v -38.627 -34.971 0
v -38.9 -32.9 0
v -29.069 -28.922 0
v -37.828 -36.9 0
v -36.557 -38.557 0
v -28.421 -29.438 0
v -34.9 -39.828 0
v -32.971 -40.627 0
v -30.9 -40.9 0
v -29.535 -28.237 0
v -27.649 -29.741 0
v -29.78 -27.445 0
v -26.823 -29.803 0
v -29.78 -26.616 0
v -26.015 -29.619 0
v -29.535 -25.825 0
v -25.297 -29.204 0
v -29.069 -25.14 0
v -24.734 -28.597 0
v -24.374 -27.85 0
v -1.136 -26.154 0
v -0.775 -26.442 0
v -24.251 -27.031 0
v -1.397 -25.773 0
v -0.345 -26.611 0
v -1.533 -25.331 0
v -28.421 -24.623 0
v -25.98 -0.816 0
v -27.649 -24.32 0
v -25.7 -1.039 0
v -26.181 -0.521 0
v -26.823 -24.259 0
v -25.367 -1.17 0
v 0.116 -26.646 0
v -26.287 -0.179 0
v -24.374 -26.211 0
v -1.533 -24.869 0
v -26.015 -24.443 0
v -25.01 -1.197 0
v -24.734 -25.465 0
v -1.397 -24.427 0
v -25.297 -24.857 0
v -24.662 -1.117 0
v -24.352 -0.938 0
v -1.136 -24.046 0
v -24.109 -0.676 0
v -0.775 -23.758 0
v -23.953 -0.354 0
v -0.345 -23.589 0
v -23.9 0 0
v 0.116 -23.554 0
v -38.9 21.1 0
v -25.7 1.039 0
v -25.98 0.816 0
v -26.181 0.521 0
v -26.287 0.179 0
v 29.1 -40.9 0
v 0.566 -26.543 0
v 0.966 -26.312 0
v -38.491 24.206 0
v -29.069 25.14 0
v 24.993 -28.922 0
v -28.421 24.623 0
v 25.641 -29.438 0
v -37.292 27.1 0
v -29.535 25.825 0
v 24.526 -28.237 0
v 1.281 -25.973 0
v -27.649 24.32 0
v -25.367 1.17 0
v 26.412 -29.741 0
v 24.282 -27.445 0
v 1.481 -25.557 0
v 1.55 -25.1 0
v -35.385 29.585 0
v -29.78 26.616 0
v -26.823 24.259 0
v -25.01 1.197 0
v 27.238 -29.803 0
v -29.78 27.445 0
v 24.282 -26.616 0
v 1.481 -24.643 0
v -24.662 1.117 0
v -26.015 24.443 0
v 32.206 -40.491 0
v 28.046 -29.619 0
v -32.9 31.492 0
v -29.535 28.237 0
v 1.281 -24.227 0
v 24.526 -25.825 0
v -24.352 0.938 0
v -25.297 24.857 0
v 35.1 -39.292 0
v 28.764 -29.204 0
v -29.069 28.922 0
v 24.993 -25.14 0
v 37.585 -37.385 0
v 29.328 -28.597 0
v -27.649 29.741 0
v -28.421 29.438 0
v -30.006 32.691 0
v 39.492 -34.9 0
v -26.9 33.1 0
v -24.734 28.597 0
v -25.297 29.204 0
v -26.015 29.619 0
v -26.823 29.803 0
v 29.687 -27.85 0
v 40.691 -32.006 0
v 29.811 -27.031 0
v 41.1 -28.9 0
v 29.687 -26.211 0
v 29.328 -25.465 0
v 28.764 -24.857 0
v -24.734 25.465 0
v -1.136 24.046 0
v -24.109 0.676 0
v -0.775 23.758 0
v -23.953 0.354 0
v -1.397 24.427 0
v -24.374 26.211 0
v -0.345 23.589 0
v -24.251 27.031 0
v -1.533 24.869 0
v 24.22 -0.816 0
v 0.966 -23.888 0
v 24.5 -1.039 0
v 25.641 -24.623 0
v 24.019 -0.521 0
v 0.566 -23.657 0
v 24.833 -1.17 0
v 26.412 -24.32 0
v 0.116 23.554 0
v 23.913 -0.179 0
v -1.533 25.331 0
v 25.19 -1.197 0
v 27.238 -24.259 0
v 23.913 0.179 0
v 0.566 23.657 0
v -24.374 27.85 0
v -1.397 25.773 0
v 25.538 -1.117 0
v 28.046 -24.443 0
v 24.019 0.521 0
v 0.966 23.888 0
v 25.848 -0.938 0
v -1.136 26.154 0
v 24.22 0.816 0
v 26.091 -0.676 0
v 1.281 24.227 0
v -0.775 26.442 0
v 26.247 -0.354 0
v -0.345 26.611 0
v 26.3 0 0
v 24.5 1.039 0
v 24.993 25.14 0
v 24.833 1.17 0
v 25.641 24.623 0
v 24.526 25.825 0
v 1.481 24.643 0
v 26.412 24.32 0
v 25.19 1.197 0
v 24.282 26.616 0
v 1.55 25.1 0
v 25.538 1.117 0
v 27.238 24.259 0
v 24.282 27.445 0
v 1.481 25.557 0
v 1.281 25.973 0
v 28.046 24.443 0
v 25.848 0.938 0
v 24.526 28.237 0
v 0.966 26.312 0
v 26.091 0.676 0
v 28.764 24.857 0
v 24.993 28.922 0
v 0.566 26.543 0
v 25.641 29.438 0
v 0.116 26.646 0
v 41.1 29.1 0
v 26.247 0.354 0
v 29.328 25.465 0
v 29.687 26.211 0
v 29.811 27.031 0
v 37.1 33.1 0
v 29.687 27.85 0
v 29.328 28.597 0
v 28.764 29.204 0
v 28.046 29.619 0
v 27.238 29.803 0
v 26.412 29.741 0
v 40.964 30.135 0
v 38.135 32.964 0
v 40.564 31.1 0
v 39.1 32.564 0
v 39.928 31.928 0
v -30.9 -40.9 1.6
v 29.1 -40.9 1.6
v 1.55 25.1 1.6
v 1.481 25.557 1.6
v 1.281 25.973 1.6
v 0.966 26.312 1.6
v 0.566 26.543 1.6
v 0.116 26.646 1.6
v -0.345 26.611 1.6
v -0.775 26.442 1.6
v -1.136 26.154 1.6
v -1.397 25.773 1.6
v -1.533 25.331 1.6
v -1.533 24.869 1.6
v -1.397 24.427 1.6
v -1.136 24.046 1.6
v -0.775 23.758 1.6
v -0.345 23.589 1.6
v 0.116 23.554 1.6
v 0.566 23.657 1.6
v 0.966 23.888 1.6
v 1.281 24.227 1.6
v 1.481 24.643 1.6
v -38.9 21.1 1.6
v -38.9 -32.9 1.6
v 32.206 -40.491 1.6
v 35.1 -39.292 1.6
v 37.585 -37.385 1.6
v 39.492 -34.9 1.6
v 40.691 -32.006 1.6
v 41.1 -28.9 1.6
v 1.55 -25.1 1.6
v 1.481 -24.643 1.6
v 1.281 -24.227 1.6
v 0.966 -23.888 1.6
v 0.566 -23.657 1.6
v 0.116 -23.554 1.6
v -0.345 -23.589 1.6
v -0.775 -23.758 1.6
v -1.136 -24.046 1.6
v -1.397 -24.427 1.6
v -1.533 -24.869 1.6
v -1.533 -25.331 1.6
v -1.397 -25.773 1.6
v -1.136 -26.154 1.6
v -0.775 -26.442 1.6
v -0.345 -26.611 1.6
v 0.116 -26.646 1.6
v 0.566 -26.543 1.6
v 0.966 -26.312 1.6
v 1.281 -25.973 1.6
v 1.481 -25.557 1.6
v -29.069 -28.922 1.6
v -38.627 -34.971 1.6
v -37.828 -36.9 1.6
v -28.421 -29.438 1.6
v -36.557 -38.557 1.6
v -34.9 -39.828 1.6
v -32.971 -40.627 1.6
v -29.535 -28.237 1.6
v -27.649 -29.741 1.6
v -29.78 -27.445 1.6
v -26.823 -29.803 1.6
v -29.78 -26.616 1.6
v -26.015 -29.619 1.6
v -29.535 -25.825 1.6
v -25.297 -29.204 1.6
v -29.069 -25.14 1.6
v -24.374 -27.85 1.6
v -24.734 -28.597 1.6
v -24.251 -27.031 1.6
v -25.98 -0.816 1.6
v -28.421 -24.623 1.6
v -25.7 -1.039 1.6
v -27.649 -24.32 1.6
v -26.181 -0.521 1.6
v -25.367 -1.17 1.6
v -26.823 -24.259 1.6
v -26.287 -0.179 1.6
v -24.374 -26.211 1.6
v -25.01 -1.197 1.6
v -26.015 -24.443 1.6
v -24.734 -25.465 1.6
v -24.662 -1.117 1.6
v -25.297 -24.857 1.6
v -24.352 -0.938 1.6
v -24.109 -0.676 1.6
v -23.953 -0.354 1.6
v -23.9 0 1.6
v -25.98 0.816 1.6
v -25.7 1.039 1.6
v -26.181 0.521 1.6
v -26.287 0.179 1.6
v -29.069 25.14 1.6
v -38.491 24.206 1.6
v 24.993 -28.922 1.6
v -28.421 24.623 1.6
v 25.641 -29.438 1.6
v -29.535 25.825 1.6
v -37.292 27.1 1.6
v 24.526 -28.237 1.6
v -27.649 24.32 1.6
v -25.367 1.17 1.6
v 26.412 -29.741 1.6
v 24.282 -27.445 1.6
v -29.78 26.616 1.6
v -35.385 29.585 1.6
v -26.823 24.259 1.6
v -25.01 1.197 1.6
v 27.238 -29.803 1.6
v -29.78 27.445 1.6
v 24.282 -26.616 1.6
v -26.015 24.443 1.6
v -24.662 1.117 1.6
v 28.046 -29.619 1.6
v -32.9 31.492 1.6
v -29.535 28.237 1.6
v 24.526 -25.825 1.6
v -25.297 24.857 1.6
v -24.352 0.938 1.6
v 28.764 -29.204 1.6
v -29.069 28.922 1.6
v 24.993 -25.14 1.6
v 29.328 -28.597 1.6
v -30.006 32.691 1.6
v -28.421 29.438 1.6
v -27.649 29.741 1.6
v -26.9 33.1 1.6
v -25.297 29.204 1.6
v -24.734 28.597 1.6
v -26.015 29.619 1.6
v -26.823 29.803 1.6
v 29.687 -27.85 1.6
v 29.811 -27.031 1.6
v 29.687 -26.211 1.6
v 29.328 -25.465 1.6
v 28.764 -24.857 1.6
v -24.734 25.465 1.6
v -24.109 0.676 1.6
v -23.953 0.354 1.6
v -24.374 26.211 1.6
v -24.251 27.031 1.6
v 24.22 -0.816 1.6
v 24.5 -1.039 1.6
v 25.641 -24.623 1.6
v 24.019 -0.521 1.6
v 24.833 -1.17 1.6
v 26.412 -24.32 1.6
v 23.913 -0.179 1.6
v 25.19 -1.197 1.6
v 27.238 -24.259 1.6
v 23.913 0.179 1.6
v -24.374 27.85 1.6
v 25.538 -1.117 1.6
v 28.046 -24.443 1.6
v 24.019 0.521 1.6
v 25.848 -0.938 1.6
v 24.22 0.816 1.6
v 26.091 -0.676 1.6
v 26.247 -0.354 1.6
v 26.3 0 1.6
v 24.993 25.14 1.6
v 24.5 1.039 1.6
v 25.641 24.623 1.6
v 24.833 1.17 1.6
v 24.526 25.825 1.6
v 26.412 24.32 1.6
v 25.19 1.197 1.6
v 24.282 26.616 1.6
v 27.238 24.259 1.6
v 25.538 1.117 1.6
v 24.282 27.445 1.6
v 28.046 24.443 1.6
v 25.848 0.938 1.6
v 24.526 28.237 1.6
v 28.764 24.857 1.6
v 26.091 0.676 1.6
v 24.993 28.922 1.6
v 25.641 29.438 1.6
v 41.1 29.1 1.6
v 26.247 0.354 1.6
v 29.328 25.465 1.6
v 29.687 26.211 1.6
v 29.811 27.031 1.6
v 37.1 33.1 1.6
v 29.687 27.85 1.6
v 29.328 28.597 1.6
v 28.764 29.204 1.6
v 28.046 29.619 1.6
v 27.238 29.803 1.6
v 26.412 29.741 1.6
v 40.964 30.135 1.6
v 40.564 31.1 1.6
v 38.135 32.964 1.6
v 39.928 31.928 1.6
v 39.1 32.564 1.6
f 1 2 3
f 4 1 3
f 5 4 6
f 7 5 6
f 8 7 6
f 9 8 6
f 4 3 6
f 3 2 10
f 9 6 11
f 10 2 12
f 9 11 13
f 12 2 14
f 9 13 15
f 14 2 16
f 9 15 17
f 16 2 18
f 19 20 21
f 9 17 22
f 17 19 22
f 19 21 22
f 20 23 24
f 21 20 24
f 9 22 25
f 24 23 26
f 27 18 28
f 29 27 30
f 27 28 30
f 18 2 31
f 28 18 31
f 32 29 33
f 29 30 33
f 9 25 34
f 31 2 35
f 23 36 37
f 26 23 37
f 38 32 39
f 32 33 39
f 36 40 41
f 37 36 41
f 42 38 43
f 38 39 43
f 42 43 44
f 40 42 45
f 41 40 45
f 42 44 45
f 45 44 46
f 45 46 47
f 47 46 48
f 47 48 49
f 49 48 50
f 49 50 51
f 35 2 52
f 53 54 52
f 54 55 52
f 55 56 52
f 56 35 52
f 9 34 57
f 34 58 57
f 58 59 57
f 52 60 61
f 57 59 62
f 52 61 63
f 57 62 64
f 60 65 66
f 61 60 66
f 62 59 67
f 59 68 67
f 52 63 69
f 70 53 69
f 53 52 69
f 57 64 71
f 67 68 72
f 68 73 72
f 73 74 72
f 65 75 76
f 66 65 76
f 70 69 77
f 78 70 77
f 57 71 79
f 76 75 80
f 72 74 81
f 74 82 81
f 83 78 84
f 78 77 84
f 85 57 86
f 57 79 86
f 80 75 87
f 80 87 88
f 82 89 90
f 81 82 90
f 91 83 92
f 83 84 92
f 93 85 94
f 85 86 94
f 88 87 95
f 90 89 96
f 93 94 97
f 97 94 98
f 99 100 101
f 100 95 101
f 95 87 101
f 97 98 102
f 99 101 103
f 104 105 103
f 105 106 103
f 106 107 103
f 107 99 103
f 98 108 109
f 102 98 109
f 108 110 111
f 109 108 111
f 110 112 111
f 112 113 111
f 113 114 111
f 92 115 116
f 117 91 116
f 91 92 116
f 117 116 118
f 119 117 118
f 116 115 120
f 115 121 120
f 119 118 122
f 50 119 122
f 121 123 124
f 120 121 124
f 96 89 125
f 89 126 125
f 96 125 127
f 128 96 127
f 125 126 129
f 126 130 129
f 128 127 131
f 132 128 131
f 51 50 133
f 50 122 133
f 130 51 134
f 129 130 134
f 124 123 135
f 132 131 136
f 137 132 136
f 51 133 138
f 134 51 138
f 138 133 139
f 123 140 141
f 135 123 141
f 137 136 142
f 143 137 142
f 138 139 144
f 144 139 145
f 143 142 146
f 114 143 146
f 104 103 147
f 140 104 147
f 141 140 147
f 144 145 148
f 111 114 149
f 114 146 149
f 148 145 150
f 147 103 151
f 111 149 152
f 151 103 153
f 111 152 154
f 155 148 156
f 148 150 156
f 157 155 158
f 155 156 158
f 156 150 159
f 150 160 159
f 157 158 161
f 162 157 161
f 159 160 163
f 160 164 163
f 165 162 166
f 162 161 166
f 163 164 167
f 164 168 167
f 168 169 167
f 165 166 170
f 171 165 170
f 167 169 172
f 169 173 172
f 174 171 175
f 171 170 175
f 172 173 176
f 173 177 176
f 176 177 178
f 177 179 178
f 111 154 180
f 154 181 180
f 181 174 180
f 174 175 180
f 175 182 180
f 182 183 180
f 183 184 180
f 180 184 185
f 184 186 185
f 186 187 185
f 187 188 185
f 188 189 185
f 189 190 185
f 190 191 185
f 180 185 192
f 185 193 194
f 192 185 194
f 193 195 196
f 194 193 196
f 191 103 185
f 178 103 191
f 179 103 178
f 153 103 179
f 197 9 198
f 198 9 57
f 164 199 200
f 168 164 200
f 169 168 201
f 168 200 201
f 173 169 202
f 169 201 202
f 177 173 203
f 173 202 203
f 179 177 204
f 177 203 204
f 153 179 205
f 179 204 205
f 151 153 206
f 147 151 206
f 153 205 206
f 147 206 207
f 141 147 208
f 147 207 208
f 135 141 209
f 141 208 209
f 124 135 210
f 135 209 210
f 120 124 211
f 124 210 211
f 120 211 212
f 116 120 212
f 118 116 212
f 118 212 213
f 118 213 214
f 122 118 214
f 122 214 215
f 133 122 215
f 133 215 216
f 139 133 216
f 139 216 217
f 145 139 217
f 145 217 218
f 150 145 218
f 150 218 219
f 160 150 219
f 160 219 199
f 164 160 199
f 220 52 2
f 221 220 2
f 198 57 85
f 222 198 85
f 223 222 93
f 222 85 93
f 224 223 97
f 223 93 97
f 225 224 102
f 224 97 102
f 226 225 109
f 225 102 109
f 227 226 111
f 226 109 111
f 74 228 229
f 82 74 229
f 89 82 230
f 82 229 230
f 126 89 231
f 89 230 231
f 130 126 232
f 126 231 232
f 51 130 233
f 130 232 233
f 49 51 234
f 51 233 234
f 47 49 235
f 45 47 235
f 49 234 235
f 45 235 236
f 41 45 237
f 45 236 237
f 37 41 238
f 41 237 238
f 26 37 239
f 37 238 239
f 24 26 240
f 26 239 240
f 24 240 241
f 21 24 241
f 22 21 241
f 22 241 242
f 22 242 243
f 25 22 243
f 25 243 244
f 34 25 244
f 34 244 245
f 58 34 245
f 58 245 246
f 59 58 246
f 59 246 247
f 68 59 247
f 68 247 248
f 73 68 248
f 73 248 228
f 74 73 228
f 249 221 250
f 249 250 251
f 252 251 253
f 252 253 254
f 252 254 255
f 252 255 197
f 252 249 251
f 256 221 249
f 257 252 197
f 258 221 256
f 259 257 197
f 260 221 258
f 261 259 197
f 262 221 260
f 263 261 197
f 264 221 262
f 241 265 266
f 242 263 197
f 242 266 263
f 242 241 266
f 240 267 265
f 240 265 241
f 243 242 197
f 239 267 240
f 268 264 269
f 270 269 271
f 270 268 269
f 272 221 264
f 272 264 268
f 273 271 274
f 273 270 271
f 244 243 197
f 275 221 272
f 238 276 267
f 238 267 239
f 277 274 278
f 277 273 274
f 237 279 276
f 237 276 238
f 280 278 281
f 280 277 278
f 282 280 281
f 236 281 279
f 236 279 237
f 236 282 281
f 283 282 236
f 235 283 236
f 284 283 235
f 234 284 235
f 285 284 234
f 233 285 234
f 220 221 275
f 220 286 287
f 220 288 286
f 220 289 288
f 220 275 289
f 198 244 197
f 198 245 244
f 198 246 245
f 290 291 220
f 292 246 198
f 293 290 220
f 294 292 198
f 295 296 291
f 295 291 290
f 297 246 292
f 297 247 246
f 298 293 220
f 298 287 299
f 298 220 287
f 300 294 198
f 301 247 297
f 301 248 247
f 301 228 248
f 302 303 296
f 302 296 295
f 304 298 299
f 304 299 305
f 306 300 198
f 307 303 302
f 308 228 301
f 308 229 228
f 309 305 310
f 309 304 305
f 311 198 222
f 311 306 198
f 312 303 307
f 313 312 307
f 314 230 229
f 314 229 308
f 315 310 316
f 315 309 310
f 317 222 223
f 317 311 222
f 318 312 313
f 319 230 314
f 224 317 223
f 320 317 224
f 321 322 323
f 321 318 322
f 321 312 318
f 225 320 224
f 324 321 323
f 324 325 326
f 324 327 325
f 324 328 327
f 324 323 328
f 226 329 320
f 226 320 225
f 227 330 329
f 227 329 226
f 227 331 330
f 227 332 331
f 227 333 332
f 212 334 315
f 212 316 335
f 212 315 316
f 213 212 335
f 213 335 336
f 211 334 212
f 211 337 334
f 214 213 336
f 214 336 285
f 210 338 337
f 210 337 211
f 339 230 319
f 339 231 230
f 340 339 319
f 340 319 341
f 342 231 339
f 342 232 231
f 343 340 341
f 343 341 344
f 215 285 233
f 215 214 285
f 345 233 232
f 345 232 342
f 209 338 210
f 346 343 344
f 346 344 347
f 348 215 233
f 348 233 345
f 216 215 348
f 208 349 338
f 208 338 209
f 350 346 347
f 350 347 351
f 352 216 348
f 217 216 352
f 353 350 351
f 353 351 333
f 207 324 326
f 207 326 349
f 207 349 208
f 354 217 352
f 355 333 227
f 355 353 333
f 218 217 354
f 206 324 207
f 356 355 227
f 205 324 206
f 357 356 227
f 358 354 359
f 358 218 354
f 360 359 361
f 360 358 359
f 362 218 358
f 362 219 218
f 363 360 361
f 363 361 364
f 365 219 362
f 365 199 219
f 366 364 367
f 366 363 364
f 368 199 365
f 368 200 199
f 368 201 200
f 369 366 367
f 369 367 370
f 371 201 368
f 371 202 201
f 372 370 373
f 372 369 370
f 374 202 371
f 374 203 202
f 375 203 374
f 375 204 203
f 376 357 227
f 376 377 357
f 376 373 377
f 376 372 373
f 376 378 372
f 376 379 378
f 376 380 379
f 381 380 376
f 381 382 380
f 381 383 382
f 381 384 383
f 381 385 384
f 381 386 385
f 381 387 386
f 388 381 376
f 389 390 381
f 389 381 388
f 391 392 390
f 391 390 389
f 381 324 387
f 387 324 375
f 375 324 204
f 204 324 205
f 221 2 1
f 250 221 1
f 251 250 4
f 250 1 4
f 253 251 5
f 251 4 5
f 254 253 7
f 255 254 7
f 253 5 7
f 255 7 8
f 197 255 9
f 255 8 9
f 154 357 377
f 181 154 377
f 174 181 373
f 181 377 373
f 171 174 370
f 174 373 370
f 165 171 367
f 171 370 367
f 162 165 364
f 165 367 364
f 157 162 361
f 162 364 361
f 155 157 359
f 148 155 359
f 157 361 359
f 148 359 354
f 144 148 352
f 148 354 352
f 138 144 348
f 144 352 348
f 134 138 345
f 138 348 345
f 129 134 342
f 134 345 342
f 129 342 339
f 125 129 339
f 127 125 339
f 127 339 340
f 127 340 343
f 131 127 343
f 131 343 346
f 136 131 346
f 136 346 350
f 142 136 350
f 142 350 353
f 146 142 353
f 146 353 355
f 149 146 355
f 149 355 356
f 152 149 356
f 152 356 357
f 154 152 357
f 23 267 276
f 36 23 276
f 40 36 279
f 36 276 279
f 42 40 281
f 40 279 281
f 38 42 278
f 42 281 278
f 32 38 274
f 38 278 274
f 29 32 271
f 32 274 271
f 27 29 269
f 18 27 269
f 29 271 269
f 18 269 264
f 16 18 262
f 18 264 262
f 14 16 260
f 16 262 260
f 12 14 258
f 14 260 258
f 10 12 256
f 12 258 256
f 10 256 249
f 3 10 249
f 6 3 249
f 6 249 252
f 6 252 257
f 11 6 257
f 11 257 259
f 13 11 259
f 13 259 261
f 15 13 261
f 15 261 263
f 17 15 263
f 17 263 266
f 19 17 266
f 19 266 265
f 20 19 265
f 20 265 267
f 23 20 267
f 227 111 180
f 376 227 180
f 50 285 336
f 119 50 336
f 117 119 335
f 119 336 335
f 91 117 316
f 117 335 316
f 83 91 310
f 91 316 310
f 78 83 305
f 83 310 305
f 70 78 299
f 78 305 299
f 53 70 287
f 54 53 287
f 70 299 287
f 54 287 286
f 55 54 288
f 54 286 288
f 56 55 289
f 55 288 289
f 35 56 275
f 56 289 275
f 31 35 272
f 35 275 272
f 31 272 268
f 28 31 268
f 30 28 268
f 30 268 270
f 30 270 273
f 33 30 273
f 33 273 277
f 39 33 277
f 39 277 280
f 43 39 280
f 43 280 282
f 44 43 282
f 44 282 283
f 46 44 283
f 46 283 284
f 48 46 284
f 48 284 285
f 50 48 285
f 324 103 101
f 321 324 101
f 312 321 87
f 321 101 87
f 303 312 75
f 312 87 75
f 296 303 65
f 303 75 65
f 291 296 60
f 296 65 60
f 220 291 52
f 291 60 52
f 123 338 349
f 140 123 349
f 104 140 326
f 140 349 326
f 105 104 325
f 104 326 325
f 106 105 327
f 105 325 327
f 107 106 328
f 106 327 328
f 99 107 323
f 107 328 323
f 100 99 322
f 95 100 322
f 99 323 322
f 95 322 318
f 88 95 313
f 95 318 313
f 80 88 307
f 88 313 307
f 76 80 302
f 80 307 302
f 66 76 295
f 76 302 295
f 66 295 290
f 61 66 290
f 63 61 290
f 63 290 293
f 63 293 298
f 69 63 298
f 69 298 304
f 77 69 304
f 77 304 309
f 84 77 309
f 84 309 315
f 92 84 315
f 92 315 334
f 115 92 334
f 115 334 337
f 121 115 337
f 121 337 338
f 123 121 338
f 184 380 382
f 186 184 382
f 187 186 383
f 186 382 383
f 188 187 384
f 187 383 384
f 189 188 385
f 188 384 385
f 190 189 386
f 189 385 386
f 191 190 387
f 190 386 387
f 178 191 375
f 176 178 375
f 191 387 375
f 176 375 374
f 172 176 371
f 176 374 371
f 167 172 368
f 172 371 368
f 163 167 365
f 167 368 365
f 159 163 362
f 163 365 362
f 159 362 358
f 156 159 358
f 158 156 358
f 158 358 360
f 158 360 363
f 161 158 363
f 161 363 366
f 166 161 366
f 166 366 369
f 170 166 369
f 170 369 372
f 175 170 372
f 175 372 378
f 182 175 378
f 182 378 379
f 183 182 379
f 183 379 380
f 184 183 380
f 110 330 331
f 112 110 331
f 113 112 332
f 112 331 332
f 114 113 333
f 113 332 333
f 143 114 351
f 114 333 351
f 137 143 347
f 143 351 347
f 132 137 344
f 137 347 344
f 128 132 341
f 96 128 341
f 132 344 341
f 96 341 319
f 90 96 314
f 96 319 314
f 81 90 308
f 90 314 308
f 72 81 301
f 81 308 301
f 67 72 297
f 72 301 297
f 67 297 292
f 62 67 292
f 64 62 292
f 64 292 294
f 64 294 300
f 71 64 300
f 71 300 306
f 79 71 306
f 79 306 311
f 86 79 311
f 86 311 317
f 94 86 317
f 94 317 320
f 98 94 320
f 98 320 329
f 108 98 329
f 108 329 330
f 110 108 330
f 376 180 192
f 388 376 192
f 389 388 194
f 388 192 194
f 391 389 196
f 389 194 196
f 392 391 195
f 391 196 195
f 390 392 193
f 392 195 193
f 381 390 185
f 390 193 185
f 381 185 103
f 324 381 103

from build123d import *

# Parameters (mm, degrees)
BOSS_EXTRUDE1_DEPTH       = 1.6
CUT_EXTRUDE3_REACH        = 3.6
SKETCH3_R                 = 1.55
SKETCH3_R_2               = 1.2
CUT_EXTRUDE4_REACH        = 3.6
PRESS_FIT_NUT_LOCATIONS_R = 2.78


with BuildPart() as part:
    # Outline → Boss-Extrude1 (new body)
    with BuildSketch(Plane.XY):
        with BuildLine():
            Line((-38.9, 21.1), (-38.9, -32.9))
            ThreePointArc((-38.9, -32.9), (-36.556854249, -38.556854249), (-30.9, -40.9))
            Line((-30.9, -40.9), (29.1, -40.9))
            ThreePointArc((29.1, -40.9), (37.585281374, -37.385281374), (41.1, -28.9))
            Line((41.1, -28.9), (41.1, 29.1))
            ThreePointArc((41.1, 29.1), (39.928427125, 31.928427125), (37.1, 33.1))
            Line((37.1, 33.1), (-26.9, 33.1))
            ThreePointArc((-26.9, 33.1), (-35.385281374, 29.585281374), (-38.9, 21.1))
        make_face()
    extrude(amount=BOSS_EXTRUDE1_DEPTH)

    # Sketch3 → Cut-Extrude3 (cut, up to next)
    with BuildSketch(Plane.XY.offset(1.6), mode=Mode.PRIVATE) as cut_extrude3_sk1:
        with Locations((-6.677e-06, 25.099991446)):
            Circle(SKETCH3_R)
    cut_extrude3_tool1 = extrude(cut_extrude3_sk1.sketch, amount=-CUT_EXTRUDE3_REACH, mode=Mode.PRIVATE) & part.part
    add(cut_extrude3_tool1.solids().sort_by_distance((-7e-06, 25.099991, 1.6))[0], mode=Mode.SUBTRACT)
    # Sketch3 → Cut-Extrude3 (cut, up to next)
    with BuildSketch(Plane.XY.offset(1.6), mode=Mode.PRIVATE) as cut_extrude3_sk2:
        with Locations((25.099993323, -8.554e-06)):
            Circle(SKETCH3_R_2)
    cut_extrude3_tool2 = extrude(cut_extrude3_sk2.sketch, amount=-CUT_EXTRUDE3_REACH, mode=Mode.PRIVATE) & part.part
    add(cut_extrude3_tool2.solids().sort_by_distance((25.099993, -9e-06, 1.6))[0], mode=Mode.SUBTRACT)
    # Sketch3 → Cut-Extrude3 (cut, up to next)
    with BuildSketch(Plane.XY.offset(1.6), mode=Mode.PRIVATE) as cut_extrude3_sk3:
        with Locations((-6.677e-06, -25.100008554)):
            Circle(SKETCH3_R)
    cut_extrude3_tool3 = extrude(cut_extrude3_sk3.sketch, amount=-CUT_EXTRUDE3_REACH, mode=Mode.PRIVATE) & part.part
    add(cut_extrude3_tool3.solids().sort_by_distance((-7e-06, -25.100009, 1.6))[0], mode=Mode.SUBTRACT)
    # Sketch3 → Cut-Extrude3 (cut, up to next)
    with BuildSketch(Plane.XY.offset(1.6), mode=Mode.PRIVATE) as cut_extrude3_sk4:
        with Locations((-25.100006677, -8.554e-06)):
            Circle(SKETCH3_R_2)
    cut_extrude3_tool4 = extrude(cut_extrude3_sk4.sketch, amount=-CUT_EXTRUDE3_REACH, mode=Mode.PRIVATE) & part.part
    add(cut_extrude3_tool4.solids().sort_by_distance((-25.100007, -9e-06, 1.6))[0], mode=Mode.SUBTRACT)

    # Press Fit Nut Locations → Cut-Extrude4 (cut, up to next)
    with BuildSketch(Plane.XY.offset(1.6), mode=Mode.PRIVATE) as cut_extrude4_sk1:
        with Locations((-27.030733336, 27.030733336)):
            Circle(PRESS_FIT_NUT_LOCATIONS_R)
    cut_extrude4_tool1 = extrude(cut_extrude4_sk1.sketch, amount=-CUT_EXTRUDE4_REACH, mode=Mode.PRIVATE) & part.part
    add(cut_extrude4_tool1.solids().sort_by_distance((-27.030733, 27.030733, 1.6))[0], mode=Mode.SUBTRACT)
    # Press Fit Nut Locations → Cut-Extrude4 (cut, up to next)
    with BuildSketch(Plane.XY.offset(1.6), mode=Mode.PRIVATE) as cut_extrude4_sk2:
        with Locations((27.030733336, 27.030733336)):
            Circle(PRESS_FIT_NUT_LOCATIONS_R)
    cut_extrude4_tool2 = extrude(cut_extrude4_sk2.sketch, amount=-CUT_EXTRUDE4_REACH, mode=Mode.PRIVATE) & part.part
    add(cut_extrude4_tool2.solids().sort_by_distance((27.030733, 27.030733, 1.6))[0], mode=Mode.SUBTRACT)
    # Press Fit Nut Locations → Cut-Extrude4 (cut, up to next)
    with BuildSketch(Plane.XY.offset(1.6), mode=Mode.PRIVATE) as cut_extrude4_sk3:
        with Locations((-27.030733336, -27.030733336)):
            Circle(PRESS_FIT_NUT_LOCATIONS_R)
    cut_extrude4_tool3 = extrude(cut_extrude4_sk3.sketch, amount=-CUT_EXTRUDE4_REACH, mode=Mode.PRIVATE) & part.part
    add(cut_extrude4_tool3.solids().sort_by_distance((-27.030733, -27.030733, 1.6))[0], mode=Mode.SUBTRACT)
    # Press Fit Nut Locations → Cut-Extrude4 (cut, up to next)
    with BuildSketch(Plane.XY.offset(1.6), mode=Mode.PRIVATE) as cut_extrude4_sk4:
        with Locations((27.030733336, -27.030733336)):
            Circle(PRESS_FIT_NUT_LOCATIONS_R)
    cut_extrude4_tool4 = extrude(cut_extrude4_sk4.sketch, amount=-CUT_EXTRUDE4_REACH, mode=Mode.PRIVATE) & part.part
    add(cut_extrude4_tool4.solids().sort_by_distance((27.030733, -27.030733, 1.6))[0], mode=Mode.SUBTRACT)


solid = part.part
